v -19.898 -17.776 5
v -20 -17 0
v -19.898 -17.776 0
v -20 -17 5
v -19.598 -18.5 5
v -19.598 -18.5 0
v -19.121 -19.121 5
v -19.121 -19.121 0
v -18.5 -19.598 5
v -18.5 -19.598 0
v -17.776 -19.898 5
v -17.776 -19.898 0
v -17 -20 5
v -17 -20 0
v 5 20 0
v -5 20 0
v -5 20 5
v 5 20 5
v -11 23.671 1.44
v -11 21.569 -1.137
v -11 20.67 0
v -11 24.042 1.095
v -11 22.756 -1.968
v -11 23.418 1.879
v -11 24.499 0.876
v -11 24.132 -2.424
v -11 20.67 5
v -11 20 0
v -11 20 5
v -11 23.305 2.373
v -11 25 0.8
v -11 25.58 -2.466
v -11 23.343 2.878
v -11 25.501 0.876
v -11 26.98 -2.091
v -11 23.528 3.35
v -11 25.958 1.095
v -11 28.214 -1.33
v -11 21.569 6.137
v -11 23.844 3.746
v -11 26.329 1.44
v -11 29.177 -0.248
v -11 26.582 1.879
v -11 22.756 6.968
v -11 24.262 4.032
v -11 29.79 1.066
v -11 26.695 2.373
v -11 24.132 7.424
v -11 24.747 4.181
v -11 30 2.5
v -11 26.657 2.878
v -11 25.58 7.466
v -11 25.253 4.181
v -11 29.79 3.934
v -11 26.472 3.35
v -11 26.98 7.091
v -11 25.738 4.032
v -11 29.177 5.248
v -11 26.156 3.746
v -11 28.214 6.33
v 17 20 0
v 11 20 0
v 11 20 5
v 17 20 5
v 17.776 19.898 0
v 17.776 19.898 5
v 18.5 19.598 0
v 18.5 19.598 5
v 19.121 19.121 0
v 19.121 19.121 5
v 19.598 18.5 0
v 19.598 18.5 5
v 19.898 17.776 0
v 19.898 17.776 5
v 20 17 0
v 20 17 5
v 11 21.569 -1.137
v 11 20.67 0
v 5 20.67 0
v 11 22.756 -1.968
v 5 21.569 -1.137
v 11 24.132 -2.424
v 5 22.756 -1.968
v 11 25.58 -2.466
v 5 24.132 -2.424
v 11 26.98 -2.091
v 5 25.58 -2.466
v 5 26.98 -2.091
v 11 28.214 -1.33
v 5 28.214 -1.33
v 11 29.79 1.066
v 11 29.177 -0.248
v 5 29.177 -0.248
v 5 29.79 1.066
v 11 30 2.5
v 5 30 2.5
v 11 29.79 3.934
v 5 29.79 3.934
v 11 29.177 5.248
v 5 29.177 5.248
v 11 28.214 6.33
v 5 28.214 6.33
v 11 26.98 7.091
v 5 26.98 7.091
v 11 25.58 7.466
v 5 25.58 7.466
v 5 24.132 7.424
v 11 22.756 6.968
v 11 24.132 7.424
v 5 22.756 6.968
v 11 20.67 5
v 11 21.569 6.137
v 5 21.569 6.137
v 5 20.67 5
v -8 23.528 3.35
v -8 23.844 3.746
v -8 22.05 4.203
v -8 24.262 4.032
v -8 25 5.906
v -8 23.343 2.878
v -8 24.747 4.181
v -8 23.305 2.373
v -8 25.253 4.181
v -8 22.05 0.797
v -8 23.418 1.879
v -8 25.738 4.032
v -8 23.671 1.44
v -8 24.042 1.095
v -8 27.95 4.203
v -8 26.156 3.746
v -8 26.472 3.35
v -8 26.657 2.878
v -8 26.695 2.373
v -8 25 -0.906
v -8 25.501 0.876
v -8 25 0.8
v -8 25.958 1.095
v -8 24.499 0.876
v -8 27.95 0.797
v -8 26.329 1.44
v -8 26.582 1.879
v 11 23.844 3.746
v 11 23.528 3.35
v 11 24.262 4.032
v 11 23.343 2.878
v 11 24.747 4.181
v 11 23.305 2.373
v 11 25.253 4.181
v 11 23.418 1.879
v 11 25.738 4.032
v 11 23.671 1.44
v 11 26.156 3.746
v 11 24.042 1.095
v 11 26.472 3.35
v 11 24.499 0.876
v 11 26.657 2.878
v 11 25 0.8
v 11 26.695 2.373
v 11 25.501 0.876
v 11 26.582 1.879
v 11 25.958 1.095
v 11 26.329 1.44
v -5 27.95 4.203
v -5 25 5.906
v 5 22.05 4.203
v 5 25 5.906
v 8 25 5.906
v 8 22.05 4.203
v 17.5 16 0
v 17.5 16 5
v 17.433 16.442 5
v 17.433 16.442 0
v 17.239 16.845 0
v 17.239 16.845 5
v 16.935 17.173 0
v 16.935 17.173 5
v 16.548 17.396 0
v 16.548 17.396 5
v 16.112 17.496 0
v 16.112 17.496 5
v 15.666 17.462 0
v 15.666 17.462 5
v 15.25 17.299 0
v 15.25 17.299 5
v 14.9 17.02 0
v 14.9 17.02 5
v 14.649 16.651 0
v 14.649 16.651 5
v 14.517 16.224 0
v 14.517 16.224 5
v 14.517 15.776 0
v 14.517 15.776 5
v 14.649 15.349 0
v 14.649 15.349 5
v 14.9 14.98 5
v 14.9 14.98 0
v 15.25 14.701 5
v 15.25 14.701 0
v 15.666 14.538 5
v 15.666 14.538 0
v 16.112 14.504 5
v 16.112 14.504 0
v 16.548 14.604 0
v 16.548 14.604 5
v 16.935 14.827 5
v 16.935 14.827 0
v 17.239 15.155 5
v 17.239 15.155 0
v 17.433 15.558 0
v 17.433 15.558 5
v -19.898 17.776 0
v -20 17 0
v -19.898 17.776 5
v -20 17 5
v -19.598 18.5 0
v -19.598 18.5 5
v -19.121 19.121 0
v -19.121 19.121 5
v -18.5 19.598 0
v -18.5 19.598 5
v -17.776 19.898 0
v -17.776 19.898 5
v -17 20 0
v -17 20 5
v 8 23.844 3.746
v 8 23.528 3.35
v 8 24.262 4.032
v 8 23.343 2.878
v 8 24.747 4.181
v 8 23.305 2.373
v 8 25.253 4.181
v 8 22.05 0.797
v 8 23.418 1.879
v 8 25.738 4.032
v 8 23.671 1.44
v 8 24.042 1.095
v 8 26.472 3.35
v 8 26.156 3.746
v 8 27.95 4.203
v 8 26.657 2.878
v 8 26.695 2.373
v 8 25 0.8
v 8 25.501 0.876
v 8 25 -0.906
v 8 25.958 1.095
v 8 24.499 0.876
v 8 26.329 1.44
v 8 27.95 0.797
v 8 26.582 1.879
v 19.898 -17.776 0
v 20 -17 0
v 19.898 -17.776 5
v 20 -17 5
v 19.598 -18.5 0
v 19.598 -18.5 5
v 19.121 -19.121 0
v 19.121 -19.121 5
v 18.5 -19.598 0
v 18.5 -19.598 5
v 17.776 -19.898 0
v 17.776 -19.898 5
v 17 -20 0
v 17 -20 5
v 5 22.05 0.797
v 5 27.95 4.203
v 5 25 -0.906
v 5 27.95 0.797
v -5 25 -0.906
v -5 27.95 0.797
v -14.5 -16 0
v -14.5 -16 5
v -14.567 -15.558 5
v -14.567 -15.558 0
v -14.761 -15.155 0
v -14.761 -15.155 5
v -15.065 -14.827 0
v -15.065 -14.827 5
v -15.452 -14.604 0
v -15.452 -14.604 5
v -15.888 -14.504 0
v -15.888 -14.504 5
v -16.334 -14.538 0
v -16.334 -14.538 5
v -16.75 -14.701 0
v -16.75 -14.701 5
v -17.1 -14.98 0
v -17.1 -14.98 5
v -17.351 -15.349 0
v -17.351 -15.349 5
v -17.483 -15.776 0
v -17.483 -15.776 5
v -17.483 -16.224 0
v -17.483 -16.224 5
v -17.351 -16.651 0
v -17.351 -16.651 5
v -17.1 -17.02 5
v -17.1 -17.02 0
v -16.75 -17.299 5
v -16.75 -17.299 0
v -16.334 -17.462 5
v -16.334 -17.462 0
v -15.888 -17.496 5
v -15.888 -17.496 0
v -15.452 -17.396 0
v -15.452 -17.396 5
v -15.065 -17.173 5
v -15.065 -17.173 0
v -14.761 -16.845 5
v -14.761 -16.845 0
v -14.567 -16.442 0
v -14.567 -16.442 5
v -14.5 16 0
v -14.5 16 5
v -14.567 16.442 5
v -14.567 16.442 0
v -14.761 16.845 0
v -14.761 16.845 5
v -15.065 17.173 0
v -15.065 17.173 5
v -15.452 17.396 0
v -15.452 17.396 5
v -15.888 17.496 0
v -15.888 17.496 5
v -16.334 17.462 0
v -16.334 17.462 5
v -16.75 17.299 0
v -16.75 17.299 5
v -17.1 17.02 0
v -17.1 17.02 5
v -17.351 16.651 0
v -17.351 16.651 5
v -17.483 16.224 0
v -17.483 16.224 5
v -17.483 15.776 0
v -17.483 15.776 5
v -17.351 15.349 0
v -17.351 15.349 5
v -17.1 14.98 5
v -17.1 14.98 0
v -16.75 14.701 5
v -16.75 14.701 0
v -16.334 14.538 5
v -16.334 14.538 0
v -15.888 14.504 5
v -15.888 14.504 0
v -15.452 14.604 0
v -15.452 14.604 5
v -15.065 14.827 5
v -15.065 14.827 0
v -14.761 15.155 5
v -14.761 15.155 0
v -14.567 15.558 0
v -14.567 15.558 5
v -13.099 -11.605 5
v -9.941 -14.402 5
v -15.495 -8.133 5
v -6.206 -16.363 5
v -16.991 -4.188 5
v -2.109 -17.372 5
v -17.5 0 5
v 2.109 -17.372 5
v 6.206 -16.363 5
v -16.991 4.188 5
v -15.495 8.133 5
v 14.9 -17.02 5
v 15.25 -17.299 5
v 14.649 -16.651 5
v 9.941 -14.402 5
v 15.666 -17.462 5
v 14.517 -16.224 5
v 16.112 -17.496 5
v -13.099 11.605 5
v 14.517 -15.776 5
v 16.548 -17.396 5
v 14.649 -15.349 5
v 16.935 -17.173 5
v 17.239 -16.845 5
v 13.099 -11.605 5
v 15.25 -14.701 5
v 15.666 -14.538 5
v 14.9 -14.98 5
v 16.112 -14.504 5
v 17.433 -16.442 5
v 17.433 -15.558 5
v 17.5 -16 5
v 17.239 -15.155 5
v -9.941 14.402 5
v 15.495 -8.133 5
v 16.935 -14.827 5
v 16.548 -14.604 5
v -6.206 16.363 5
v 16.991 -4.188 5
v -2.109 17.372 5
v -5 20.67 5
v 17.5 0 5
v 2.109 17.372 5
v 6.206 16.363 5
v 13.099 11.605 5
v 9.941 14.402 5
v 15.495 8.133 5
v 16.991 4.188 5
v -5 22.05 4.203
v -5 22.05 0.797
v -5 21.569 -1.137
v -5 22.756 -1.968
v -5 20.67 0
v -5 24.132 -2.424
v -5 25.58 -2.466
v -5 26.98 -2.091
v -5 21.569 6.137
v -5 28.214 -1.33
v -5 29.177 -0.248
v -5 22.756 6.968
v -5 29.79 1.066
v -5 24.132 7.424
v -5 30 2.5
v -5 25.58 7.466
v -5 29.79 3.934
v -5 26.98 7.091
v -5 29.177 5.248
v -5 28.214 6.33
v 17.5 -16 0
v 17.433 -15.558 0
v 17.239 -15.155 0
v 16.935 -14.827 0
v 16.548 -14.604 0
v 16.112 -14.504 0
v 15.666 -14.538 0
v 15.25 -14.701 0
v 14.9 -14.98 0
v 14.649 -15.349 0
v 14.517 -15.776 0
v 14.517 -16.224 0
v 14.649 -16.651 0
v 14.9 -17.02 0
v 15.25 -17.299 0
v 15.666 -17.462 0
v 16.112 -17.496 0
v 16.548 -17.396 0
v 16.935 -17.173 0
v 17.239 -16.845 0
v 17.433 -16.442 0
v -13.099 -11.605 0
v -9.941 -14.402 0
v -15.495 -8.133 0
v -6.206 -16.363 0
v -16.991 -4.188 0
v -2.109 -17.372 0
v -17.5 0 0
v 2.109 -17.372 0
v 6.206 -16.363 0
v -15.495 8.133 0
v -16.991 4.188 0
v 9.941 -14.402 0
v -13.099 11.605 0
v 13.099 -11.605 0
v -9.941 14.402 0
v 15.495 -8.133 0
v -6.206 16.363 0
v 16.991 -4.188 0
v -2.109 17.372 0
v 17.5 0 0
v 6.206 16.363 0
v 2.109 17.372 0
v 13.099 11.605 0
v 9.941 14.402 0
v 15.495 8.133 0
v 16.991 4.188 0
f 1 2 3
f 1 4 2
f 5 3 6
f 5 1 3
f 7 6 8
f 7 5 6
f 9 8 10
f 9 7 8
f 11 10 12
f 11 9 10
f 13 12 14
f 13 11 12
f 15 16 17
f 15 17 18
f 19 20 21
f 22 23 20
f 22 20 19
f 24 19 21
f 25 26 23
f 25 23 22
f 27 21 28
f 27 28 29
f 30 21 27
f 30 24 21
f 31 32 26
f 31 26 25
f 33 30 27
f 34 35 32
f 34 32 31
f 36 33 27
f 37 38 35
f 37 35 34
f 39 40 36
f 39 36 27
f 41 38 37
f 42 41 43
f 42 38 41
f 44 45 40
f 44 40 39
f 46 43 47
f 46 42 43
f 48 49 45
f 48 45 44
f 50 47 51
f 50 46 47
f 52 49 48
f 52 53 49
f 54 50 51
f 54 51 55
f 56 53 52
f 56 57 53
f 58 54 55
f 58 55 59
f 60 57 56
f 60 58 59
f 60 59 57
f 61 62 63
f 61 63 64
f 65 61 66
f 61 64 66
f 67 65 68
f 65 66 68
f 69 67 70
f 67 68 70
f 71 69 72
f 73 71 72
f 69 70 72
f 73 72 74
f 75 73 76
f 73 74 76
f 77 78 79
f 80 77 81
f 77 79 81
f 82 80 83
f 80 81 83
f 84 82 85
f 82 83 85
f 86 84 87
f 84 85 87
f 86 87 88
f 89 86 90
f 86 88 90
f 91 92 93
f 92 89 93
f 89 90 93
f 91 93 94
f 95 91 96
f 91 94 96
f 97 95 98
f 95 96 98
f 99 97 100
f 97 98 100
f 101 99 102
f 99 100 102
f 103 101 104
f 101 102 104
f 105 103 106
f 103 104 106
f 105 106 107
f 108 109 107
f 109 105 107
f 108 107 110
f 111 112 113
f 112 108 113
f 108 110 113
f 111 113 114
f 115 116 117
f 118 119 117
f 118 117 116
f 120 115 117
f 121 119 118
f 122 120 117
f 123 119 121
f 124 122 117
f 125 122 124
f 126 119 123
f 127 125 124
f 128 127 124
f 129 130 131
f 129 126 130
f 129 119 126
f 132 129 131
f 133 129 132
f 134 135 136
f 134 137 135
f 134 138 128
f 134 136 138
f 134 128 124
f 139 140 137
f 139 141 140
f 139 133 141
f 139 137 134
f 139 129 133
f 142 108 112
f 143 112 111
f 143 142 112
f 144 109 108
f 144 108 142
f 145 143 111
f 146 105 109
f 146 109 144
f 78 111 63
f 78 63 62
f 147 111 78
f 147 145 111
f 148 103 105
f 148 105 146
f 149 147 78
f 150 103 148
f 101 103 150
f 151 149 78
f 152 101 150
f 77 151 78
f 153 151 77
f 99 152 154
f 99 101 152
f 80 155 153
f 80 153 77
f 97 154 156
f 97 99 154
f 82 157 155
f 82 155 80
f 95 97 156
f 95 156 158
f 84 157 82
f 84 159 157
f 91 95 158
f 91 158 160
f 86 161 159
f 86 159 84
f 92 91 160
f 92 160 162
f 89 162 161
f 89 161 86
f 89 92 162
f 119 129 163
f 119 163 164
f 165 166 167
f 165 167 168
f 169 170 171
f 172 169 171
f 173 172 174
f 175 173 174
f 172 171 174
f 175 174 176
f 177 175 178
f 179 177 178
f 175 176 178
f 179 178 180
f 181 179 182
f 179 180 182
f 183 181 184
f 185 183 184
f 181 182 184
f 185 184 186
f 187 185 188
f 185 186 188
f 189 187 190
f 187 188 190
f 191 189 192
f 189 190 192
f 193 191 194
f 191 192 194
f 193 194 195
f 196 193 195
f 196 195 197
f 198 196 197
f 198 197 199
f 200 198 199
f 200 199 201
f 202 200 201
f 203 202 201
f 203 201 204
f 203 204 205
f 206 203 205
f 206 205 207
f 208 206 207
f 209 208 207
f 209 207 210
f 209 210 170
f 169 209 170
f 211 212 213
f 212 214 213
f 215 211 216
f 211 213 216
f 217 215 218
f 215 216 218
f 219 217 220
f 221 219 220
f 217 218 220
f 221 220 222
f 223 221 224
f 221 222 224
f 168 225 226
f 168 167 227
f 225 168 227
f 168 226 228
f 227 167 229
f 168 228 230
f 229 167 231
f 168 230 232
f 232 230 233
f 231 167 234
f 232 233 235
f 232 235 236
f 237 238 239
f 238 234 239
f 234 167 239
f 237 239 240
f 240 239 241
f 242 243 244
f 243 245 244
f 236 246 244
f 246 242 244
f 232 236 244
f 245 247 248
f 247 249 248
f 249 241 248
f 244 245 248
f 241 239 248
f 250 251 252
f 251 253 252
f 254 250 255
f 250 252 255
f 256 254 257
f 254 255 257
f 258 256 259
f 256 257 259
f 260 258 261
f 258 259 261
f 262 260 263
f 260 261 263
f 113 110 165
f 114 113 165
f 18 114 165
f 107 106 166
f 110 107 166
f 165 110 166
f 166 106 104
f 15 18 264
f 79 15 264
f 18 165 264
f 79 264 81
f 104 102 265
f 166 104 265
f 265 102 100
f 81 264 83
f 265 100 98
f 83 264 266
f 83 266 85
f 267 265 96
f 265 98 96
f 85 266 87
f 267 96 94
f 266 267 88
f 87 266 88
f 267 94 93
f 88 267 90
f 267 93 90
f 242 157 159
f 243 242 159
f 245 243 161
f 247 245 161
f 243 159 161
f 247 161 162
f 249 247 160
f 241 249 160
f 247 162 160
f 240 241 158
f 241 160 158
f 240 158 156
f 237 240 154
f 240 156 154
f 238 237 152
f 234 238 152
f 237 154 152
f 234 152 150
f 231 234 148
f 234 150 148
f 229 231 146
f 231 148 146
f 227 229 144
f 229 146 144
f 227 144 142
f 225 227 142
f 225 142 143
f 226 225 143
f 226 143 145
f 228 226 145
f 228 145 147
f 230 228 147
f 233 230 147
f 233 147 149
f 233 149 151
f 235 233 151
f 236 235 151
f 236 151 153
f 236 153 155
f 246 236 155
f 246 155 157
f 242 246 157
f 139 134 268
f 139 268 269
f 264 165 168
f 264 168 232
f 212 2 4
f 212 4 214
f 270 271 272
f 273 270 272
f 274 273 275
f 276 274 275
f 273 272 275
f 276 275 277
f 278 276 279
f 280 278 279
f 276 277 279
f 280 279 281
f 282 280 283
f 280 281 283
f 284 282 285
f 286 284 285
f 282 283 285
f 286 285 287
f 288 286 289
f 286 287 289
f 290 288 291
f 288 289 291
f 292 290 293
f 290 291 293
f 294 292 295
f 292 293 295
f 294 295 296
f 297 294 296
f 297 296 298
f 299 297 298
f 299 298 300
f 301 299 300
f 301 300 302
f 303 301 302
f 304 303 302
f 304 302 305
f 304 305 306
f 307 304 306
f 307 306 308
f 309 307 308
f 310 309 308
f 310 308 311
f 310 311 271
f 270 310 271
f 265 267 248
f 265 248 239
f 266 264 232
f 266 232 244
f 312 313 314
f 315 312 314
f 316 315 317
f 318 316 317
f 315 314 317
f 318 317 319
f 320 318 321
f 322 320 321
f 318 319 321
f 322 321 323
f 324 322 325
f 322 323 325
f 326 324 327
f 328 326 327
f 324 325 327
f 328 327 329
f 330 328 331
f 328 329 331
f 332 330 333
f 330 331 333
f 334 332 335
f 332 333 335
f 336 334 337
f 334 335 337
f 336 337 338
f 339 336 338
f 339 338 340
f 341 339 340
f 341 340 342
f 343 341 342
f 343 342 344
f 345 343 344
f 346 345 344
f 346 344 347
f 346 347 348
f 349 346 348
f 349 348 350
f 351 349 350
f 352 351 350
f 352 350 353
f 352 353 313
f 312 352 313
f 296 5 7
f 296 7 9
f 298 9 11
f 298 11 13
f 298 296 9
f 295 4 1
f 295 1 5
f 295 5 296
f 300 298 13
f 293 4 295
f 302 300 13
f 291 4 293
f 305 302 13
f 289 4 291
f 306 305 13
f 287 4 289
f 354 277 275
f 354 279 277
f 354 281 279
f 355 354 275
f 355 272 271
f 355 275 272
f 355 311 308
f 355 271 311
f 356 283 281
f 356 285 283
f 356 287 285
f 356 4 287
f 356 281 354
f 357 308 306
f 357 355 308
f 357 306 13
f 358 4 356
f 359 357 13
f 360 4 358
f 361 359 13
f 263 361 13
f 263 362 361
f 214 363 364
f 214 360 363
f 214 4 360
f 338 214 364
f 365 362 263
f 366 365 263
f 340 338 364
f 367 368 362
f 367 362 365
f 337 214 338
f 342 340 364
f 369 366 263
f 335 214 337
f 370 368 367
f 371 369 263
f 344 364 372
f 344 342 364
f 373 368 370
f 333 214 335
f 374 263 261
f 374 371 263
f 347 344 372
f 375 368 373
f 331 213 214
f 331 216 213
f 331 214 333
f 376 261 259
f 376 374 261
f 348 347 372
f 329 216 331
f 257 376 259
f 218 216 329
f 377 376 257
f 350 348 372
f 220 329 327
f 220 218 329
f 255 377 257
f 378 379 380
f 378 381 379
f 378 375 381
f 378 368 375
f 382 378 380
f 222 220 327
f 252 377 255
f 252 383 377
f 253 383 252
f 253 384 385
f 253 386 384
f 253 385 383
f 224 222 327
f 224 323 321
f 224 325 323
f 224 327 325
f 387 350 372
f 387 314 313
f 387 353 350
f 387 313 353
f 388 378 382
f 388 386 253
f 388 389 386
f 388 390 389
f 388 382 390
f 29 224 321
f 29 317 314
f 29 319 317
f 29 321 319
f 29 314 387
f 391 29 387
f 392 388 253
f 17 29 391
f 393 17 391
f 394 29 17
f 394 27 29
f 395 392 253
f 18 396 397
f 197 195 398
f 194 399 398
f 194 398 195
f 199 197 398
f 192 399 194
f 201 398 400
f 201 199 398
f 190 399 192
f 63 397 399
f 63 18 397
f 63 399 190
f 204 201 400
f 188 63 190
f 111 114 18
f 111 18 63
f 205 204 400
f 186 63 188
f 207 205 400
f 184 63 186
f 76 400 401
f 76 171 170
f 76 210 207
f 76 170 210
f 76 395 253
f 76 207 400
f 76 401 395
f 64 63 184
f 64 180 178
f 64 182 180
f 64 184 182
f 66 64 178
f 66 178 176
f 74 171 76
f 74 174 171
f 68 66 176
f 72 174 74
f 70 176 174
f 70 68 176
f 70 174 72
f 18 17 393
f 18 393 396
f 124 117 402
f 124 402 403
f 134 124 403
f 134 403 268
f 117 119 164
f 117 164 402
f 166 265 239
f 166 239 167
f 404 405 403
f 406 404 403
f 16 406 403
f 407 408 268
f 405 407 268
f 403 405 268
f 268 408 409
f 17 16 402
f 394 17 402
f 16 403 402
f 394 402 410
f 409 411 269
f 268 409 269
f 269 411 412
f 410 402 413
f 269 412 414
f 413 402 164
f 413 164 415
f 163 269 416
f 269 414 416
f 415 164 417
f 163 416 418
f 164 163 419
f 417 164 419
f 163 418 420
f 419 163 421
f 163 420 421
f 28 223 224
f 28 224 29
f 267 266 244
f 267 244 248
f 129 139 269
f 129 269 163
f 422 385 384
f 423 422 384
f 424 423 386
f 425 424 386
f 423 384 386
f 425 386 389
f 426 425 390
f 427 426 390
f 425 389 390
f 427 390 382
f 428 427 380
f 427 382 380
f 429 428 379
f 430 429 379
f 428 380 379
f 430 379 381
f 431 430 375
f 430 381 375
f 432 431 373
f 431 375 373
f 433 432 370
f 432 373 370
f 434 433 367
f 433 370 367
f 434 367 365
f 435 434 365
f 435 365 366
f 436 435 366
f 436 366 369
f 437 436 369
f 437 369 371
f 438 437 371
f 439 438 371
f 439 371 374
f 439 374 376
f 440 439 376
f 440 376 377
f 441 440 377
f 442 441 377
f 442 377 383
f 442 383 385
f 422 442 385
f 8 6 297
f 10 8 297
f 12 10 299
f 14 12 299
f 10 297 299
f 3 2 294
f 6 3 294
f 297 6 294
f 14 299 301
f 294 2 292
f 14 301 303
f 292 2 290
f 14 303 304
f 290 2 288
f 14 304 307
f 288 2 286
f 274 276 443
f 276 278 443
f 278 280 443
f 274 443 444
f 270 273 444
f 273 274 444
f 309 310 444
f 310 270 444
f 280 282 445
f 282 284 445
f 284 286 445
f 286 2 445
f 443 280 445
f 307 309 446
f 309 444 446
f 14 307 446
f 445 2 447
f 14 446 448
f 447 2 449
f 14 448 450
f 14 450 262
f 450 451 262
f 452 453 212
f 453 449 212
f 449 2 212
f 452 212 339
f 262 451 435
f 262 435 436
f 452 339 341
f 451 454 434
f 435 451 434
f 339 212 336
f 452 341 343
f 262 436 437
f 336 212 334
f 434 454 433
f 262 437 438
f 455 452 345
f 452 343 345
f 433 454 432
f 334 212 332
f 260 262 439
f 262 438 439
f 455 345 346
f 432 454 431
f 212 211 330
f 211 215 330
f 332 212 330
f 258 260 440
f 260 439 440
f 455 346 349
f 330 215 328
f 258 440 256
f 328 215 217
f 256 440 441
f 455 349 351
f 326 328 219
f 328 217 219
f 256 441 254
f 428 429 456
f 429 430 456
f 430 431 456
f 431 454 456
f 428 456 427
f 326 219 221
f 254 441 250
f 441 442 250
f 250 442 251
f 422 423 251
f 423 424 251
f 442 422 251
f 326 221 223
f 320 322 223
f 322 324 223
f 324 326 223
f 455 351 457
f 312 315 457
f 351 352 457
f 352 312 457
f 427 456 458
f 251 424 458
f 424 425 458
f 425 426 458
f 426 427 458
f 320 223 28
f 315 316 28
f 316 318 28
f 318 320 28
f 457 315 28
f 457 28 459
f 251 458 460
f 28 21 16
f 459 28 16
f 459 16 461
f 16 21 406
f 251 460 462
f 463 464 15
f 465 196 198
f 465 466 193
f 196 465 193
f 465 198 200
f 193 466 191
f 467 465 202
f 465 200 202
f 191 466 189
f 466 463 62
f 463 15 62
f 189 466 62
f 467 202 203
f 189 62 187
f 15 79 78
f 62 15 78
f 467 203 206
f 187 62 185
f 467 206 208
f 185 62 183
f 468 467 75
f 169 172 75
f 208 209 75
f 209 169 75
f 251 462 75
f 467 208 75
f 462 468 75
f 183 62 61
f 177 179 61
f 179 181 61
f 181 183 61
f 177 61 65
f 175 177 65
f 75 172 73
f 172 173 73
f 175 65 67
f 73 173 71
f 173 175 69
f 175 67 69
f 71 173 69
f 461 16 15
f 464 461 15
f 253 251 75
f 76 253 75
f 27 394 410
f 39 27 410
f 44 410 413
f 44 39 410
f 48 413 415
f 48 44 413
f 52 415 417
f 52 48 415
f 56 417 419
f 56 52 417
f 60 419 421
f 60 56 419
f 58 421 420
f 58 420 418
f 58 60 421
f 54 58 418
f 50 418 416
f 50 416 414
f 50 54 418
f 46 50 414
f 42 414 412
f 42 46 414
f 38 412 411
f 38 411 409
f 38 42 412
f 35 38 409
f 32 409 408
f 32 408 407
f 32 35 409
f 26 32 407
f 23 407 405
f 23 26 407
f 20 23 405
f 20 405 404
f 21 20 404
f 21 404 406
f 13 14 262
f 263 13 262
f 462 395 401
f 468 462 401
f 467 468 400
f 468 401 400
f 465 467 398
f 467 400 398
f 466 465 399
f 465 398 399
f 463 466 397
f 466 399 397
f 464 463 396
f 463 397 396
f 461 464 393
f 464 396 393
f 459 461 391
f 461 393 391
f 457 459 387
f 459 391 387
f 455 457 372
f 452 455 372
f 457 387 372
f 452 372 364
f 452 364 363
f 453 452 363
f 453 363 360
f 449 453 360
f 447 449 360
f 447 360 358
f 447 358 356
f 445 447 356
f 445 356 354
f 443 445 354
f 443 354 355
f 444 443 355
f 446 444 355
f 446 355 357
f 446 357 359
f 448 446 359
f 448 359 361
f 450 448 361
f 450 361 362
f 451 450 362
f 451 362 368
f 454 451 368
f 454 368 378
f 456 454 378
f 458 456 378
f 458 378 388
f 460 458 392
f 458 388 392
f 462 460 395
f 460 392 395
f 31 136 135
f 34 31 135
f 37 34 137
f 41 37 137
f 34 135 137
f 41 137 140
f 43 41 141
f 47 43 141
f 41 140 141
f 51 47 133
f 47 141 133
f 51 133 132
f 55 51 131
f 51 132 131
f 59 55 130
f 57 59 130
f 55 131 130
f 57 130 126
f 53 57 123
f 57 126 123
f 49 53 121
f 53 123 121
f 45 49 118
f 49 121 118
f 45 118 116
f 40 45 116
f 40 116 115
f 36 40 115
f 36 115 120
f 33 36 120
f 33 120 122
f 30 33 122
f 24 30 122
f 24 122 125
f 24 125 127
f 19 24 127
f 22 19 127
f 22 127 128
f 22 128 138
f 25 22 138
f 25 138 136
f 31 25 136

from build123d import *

# Parameters (mm, degrees)
SKETCH_1_W                = 40
SKETCH_1_H                = 40
EXTRUDE_1_DEPTH           = 5
SKETCH_2_R                = 1.5
SKETCH_2_R_2              = 16
CUT_EXTRUDE_1_DEPTH       = 29.722813233
SKETCH_3_W                = 6
SKETCH_3_H                = 5
EXTRUDE_2_DEPTH           = 10
SKETCH_4_R                = 3
EXTRUDE_3_DEPTH           = 6
EXTRUDE_START             = -6
SKETCH_5_R                = 3
EXTRUDE_4_DEPTH           = 6
CUT_EXTRUDE_2_DEPTH       = 44.488504228
SKETCH_7_R                = 1.5
CUT_EXTRUDE_3_DEPTH       = 43.133715716
SKETCH_9_R                = 4
EXTRUDE_5_DEPTH           = 6
SKETCH_10_R               = 4
EXTRUDE_6_DEPTH           = 6
SKETCH_11_R               = 1.5
CUT_EXTRUDE_4_DEPTH       = 43.944731924
CUT_EXTRUDE_5_DEPTH       = 13
CUT_EXTRUDE_5_DEPTH_BACK  = 3
FILLET_1_R                = 3
CUT_EXTRUDE_6_DEPTH       = 3
CUT_EXTRUDE_7_DEPTH       = 3
SKETCH_15_R               = 1.65
CUT_EXTRUDE_8_DEPTH       = 43.944731924
SKETCH_16_R               = 5
EXTRUDE_7_DEPTH           = 6
SKETCH_17_R               = 5
EXTRUDE_8_DEPTH           = 6
SKETCH_18_R               = 1.7
CUT_EXTRUDE_9_DEPTH       = 44.786413418
CUT_EXTRUDE_10_DEPTH      = 13
CUT_EXTRUDE_10_DEPTH_BACK = 3
SKETCH_20_R               = 17.5
CUT_EXTRUDE_11_DEPTH      = 37.827299657


with BuildPart() as part:
    # Эскиз1 → Бобышка-Вытянуть1 (new body)
    with BuildSketch(Plane.XY):
        Rectangle(SKETCH_1_W, SKETCH_1_H)
    extrude(amount=EXTRUDE_1_DEPTH)

    # Эскиз2 → Вырез-Вытянуть1 (cut, through all)
    with BuildSketch(Plane.XY.offset(5)):
        with Locations((-16, 16)):
            Circle(SKETCH_2_R)
        Circle(SKETCH_2_R_2)
        with Locations((16, 16)):
            Circle(SKETCH_2_R)
        with Locations((16, -16)):
            Circle(SKETCH_2_R)
        with Locations((-16, -16)):
            Circle(SKETCH_2_R)
    extrude(amount=-CUT_EXTRUDE_1_DEPTH, mode=Mode.SUBTRACT)

    # Эскиз3 → Бобышка-Вытянуть2 (add)
    with BuildSketch(Plane(origin=(0, 20, 0), x_dir=(1, 0, 0), z_dir=(0, 1, 0))):
        with Locations((-8, -2.5)):
            Rectangle(SKETCH_3_W, SKETCH_3_H)
        with Locations((8, -2.5)):
            Rectangle(SKETCH_3_W, SKETCH_3_H)
    extrude(amount=EXTRUDE_2_DEPTH)

    # Эскиз4 → Бобышка-Вытянуть3 (add)
    with BuildSketch(Plane.ZY.offset(11)):
        with Locations((2.5, 25)):
            Circle(SKETCH_4_R)
    extrude(amount=-EXTRUDE_3_DEPTH)

    # Эскиз5 → Бобышка-Вытянуть4 (add)
    with BuildSketch(Plane(origin=(11, 0, 0), x_dir=(0, 0, -1), z_dir=(1, 0, 0)).offset(EXTRUDE_START)):
        with Locations((-2.5, 25)):
            Circle(SKETCH_5_R)
    extrude(amount=EXTRUDE_4_DEPTH)

    # Эскиз6 → Вырез-Вытянуть2 (cut, through all)
    with BuildSketch(Plane(origin=(11, 0, 0), x_dir=(0, 0, -1), z_dir=(1, 0, 0))):
        with BuildLine():
            Line((0, 30), (-5, 30))
            Line((-5, 30), (-5, 26.658312395))
            ThreePointArc((-5, 26.658312395), (-2.5, 28), (0, 26.658312395))
            Line((0, 26.658312395), (0, 30))
        make_face()
    extrude(amount=-CUT_EXTRUDE_2_DEPTH, mode=Mode.SUBTRACT)

    # Эскиз7 → Вырез-Вытянуть3 (cut, through all)
    with BuildSketch(Plane.ZY.offset(11)):
        with Locations((2.5, 25)):
            Circle(SKETCH_7_R)
    extrude(amount=-CUT_EXTRUDE_3_DEPTH, mode=Mode.SUBTRACT)

    # Эскиз9 → Бобышка-Вытянуть5 (add)
    with BuildSketch(Plane.ZY.offset(11)):
        with Locations((2.5, 25)):
            Circle(SKETCH_9_R)
    extrude(amount=-EXTRUDE_5_DEPTH)

    # Эскиз10 → Бобышка-Вытянуть6 (add)
    with BuildSketch(Plane(origin=(11, 0, 0), x_dir=(0, 0, -1), z_dir=(1, 0, 0)).offset(EXTRUDE_START)):
        with Locations((-2.5, 25)):
            Circle(SKETCH_10_R)
    extrude(amount=EXTRUDE_6_DEPTH)

    # Эскиз11 → Вырез-Вытянуть4 (cut, through all)
    with BuildSketch(Plane(origin=(11, 0, 0), x_dir=(0, 0, -1), z_dir=(1, 0, 0))):
        with Locations((-2.5, 25)):
            Circle(SKETCH_11_R)
    extrude(amount=-CUT_EXTRUDE_4_DEPTH, mode=Mode.SUBTRACT)

    # Эскиз12 → Вырез-Вытянуть5 (cut, two sides: drawn at the far end of the back side and taken through both)
    with BuildSketch(Plane(origin=(-5, 0, 0), x_dir=(0, 0, -1), z_dir=(1, 0, 0)).offset(-CUT_EXTRUDE_5_DEPTH_BACK)):
        Polygon((-0.91228676, 22.25), (0.675426481, 25), (-0.91228676, 27.75), (-4.08771324, 27.75), (-5.675426481, 25), (-4.08771324, 22.25), align=None)
    extrude(amount=CUT_EXTRUDE_5_DEPTH + CUT_EXTRUDE_5_DEPTH_BACK, mode=Mode.SUBTRACT)

    # Скругление1
    fillet_1_edges = [part.edges().sort_by_distance(p)[0] for p in [
        (20, -20, 2.5),
        (-20, -20, 2.5),
        (-20, 20, 2.5),
        (20, 20, 2.5),
    ]]
    fillet(fillet_1_edges, radius=FILLET_1_R)

    # Эскиз13 → Вырез-Вытянуть6 (cut)
    with BuildSketch(Plane(origin=(-5, 0, 0), x_dir=(0, 0, -1), z_dir=(1, 0, 0))):
        Polygon((-4.174315781, 22.1), (-0.825684219, 22.1), (0.848631561, 25), (-0.825684219, 27.9), (-4.174315781, 27.9), (-5.848631561, 25), align=None)
    extrude(amount=-CUT_EXTRUDE_6_DEPTH, mode=Mode.SUBTRACT)

    # Эскиз14 → Вырез-Вытянуть7 (cut)
    with BuildSketch(Plane.ZY.offset(-5)):
        Polygon((4.174315781, 22.1), (5.848631561, 25), (4.174315781, 27.9), (0.825684219, 27.9), (-0.848631561, 25), (0.825684219, 22.1), align=None)
    extrude(amount=-CUT_EXTRUDE_7_DEPTH, mode=Mode.SUBTRACT)

    # Эскиз15 → Вырез-Вытянуть8 (cut, through all)
    with BuildSketch(Plane.ZY.offset(11)):
        with Locations(Location((2.5, 25, 0), (0, 0, 180))):
            Circle(SKETCH_15_R)
    extrude(amount=-CUT_EXTRUDE_8_DEPTH, mode=Mode.SUBTRACT)

    # Эскиз16 → Бобышка-Вытянуть7 (add)
    with BuildSketch(Plane.ZY.offset(11)):
        with Locations((2.5, 25)):
            Circle(SKETCH_16_R)
    extrude(amount=-EXTRUDE_7_DEPTH)

    # Эскиз17 → Бобышка-Вытянуть8 (add)
    with BuildSketch(Plane(origin=(11, 0, 0), x_dir=(0, 0, -1), z_dir=(1, 0, 0)).offset(EXTRUDE_START)):
        with Locations((-2.5, 25)):
            Circle(SKETCH_17_R)
    extrude(amount=EXTRUDE_8_DEPTH)

    # Эскиз18 → Вырез-Вытянуть9 (cut, through all)
    with BuildSketch(Plane(origin=(11, 0, 0), x_dir=(0, 0, -1), z_dir=(1, 0, 0))):
        with Locations((-2.5, 25)):
            Circle(SKETCH_18_R)
    extrude(amount=-CUT_EXTRUDE_9_DEPTH, mode=Mode.SUBTRACT)

    # Эскиз19 → Вырез-Вытянуть10 (cut, two sides: drawn at the far end of the back side and taken through both)
    with BuildSketch(Plane(origin=(-5, 0, 0), x_dir=(0, 0, -1), z_dir=(1, 0, 0)).offset(-CUT_EXTRUDE_10_DEPTH_BACK)):
        Polygon((-4.203183294, 22.05), (-0.796816706, 22.05), (0.906366588, 25), (-0.796816706, 27.95), (-4.203183294, 27.95), (-5.906366588, 25), align=None)
    extrude(amount=CUT_EXTRUDE_10_DEPTH + CUT_EXTRUDE_10_DEPTH_BACK, mode=Mode.SUBTRACT)

    # Эскиз20 → Вырез-Вытянуть11 (cut, through all)
    with BuildSketch(Plane.XY.offset(5)):
        Circle(SKETCH_20_R)
    extrude(amount=-CUT_EXTRUDE_11_DEPTH, mode=Mode.SUBTRACT)


solid = part.part
